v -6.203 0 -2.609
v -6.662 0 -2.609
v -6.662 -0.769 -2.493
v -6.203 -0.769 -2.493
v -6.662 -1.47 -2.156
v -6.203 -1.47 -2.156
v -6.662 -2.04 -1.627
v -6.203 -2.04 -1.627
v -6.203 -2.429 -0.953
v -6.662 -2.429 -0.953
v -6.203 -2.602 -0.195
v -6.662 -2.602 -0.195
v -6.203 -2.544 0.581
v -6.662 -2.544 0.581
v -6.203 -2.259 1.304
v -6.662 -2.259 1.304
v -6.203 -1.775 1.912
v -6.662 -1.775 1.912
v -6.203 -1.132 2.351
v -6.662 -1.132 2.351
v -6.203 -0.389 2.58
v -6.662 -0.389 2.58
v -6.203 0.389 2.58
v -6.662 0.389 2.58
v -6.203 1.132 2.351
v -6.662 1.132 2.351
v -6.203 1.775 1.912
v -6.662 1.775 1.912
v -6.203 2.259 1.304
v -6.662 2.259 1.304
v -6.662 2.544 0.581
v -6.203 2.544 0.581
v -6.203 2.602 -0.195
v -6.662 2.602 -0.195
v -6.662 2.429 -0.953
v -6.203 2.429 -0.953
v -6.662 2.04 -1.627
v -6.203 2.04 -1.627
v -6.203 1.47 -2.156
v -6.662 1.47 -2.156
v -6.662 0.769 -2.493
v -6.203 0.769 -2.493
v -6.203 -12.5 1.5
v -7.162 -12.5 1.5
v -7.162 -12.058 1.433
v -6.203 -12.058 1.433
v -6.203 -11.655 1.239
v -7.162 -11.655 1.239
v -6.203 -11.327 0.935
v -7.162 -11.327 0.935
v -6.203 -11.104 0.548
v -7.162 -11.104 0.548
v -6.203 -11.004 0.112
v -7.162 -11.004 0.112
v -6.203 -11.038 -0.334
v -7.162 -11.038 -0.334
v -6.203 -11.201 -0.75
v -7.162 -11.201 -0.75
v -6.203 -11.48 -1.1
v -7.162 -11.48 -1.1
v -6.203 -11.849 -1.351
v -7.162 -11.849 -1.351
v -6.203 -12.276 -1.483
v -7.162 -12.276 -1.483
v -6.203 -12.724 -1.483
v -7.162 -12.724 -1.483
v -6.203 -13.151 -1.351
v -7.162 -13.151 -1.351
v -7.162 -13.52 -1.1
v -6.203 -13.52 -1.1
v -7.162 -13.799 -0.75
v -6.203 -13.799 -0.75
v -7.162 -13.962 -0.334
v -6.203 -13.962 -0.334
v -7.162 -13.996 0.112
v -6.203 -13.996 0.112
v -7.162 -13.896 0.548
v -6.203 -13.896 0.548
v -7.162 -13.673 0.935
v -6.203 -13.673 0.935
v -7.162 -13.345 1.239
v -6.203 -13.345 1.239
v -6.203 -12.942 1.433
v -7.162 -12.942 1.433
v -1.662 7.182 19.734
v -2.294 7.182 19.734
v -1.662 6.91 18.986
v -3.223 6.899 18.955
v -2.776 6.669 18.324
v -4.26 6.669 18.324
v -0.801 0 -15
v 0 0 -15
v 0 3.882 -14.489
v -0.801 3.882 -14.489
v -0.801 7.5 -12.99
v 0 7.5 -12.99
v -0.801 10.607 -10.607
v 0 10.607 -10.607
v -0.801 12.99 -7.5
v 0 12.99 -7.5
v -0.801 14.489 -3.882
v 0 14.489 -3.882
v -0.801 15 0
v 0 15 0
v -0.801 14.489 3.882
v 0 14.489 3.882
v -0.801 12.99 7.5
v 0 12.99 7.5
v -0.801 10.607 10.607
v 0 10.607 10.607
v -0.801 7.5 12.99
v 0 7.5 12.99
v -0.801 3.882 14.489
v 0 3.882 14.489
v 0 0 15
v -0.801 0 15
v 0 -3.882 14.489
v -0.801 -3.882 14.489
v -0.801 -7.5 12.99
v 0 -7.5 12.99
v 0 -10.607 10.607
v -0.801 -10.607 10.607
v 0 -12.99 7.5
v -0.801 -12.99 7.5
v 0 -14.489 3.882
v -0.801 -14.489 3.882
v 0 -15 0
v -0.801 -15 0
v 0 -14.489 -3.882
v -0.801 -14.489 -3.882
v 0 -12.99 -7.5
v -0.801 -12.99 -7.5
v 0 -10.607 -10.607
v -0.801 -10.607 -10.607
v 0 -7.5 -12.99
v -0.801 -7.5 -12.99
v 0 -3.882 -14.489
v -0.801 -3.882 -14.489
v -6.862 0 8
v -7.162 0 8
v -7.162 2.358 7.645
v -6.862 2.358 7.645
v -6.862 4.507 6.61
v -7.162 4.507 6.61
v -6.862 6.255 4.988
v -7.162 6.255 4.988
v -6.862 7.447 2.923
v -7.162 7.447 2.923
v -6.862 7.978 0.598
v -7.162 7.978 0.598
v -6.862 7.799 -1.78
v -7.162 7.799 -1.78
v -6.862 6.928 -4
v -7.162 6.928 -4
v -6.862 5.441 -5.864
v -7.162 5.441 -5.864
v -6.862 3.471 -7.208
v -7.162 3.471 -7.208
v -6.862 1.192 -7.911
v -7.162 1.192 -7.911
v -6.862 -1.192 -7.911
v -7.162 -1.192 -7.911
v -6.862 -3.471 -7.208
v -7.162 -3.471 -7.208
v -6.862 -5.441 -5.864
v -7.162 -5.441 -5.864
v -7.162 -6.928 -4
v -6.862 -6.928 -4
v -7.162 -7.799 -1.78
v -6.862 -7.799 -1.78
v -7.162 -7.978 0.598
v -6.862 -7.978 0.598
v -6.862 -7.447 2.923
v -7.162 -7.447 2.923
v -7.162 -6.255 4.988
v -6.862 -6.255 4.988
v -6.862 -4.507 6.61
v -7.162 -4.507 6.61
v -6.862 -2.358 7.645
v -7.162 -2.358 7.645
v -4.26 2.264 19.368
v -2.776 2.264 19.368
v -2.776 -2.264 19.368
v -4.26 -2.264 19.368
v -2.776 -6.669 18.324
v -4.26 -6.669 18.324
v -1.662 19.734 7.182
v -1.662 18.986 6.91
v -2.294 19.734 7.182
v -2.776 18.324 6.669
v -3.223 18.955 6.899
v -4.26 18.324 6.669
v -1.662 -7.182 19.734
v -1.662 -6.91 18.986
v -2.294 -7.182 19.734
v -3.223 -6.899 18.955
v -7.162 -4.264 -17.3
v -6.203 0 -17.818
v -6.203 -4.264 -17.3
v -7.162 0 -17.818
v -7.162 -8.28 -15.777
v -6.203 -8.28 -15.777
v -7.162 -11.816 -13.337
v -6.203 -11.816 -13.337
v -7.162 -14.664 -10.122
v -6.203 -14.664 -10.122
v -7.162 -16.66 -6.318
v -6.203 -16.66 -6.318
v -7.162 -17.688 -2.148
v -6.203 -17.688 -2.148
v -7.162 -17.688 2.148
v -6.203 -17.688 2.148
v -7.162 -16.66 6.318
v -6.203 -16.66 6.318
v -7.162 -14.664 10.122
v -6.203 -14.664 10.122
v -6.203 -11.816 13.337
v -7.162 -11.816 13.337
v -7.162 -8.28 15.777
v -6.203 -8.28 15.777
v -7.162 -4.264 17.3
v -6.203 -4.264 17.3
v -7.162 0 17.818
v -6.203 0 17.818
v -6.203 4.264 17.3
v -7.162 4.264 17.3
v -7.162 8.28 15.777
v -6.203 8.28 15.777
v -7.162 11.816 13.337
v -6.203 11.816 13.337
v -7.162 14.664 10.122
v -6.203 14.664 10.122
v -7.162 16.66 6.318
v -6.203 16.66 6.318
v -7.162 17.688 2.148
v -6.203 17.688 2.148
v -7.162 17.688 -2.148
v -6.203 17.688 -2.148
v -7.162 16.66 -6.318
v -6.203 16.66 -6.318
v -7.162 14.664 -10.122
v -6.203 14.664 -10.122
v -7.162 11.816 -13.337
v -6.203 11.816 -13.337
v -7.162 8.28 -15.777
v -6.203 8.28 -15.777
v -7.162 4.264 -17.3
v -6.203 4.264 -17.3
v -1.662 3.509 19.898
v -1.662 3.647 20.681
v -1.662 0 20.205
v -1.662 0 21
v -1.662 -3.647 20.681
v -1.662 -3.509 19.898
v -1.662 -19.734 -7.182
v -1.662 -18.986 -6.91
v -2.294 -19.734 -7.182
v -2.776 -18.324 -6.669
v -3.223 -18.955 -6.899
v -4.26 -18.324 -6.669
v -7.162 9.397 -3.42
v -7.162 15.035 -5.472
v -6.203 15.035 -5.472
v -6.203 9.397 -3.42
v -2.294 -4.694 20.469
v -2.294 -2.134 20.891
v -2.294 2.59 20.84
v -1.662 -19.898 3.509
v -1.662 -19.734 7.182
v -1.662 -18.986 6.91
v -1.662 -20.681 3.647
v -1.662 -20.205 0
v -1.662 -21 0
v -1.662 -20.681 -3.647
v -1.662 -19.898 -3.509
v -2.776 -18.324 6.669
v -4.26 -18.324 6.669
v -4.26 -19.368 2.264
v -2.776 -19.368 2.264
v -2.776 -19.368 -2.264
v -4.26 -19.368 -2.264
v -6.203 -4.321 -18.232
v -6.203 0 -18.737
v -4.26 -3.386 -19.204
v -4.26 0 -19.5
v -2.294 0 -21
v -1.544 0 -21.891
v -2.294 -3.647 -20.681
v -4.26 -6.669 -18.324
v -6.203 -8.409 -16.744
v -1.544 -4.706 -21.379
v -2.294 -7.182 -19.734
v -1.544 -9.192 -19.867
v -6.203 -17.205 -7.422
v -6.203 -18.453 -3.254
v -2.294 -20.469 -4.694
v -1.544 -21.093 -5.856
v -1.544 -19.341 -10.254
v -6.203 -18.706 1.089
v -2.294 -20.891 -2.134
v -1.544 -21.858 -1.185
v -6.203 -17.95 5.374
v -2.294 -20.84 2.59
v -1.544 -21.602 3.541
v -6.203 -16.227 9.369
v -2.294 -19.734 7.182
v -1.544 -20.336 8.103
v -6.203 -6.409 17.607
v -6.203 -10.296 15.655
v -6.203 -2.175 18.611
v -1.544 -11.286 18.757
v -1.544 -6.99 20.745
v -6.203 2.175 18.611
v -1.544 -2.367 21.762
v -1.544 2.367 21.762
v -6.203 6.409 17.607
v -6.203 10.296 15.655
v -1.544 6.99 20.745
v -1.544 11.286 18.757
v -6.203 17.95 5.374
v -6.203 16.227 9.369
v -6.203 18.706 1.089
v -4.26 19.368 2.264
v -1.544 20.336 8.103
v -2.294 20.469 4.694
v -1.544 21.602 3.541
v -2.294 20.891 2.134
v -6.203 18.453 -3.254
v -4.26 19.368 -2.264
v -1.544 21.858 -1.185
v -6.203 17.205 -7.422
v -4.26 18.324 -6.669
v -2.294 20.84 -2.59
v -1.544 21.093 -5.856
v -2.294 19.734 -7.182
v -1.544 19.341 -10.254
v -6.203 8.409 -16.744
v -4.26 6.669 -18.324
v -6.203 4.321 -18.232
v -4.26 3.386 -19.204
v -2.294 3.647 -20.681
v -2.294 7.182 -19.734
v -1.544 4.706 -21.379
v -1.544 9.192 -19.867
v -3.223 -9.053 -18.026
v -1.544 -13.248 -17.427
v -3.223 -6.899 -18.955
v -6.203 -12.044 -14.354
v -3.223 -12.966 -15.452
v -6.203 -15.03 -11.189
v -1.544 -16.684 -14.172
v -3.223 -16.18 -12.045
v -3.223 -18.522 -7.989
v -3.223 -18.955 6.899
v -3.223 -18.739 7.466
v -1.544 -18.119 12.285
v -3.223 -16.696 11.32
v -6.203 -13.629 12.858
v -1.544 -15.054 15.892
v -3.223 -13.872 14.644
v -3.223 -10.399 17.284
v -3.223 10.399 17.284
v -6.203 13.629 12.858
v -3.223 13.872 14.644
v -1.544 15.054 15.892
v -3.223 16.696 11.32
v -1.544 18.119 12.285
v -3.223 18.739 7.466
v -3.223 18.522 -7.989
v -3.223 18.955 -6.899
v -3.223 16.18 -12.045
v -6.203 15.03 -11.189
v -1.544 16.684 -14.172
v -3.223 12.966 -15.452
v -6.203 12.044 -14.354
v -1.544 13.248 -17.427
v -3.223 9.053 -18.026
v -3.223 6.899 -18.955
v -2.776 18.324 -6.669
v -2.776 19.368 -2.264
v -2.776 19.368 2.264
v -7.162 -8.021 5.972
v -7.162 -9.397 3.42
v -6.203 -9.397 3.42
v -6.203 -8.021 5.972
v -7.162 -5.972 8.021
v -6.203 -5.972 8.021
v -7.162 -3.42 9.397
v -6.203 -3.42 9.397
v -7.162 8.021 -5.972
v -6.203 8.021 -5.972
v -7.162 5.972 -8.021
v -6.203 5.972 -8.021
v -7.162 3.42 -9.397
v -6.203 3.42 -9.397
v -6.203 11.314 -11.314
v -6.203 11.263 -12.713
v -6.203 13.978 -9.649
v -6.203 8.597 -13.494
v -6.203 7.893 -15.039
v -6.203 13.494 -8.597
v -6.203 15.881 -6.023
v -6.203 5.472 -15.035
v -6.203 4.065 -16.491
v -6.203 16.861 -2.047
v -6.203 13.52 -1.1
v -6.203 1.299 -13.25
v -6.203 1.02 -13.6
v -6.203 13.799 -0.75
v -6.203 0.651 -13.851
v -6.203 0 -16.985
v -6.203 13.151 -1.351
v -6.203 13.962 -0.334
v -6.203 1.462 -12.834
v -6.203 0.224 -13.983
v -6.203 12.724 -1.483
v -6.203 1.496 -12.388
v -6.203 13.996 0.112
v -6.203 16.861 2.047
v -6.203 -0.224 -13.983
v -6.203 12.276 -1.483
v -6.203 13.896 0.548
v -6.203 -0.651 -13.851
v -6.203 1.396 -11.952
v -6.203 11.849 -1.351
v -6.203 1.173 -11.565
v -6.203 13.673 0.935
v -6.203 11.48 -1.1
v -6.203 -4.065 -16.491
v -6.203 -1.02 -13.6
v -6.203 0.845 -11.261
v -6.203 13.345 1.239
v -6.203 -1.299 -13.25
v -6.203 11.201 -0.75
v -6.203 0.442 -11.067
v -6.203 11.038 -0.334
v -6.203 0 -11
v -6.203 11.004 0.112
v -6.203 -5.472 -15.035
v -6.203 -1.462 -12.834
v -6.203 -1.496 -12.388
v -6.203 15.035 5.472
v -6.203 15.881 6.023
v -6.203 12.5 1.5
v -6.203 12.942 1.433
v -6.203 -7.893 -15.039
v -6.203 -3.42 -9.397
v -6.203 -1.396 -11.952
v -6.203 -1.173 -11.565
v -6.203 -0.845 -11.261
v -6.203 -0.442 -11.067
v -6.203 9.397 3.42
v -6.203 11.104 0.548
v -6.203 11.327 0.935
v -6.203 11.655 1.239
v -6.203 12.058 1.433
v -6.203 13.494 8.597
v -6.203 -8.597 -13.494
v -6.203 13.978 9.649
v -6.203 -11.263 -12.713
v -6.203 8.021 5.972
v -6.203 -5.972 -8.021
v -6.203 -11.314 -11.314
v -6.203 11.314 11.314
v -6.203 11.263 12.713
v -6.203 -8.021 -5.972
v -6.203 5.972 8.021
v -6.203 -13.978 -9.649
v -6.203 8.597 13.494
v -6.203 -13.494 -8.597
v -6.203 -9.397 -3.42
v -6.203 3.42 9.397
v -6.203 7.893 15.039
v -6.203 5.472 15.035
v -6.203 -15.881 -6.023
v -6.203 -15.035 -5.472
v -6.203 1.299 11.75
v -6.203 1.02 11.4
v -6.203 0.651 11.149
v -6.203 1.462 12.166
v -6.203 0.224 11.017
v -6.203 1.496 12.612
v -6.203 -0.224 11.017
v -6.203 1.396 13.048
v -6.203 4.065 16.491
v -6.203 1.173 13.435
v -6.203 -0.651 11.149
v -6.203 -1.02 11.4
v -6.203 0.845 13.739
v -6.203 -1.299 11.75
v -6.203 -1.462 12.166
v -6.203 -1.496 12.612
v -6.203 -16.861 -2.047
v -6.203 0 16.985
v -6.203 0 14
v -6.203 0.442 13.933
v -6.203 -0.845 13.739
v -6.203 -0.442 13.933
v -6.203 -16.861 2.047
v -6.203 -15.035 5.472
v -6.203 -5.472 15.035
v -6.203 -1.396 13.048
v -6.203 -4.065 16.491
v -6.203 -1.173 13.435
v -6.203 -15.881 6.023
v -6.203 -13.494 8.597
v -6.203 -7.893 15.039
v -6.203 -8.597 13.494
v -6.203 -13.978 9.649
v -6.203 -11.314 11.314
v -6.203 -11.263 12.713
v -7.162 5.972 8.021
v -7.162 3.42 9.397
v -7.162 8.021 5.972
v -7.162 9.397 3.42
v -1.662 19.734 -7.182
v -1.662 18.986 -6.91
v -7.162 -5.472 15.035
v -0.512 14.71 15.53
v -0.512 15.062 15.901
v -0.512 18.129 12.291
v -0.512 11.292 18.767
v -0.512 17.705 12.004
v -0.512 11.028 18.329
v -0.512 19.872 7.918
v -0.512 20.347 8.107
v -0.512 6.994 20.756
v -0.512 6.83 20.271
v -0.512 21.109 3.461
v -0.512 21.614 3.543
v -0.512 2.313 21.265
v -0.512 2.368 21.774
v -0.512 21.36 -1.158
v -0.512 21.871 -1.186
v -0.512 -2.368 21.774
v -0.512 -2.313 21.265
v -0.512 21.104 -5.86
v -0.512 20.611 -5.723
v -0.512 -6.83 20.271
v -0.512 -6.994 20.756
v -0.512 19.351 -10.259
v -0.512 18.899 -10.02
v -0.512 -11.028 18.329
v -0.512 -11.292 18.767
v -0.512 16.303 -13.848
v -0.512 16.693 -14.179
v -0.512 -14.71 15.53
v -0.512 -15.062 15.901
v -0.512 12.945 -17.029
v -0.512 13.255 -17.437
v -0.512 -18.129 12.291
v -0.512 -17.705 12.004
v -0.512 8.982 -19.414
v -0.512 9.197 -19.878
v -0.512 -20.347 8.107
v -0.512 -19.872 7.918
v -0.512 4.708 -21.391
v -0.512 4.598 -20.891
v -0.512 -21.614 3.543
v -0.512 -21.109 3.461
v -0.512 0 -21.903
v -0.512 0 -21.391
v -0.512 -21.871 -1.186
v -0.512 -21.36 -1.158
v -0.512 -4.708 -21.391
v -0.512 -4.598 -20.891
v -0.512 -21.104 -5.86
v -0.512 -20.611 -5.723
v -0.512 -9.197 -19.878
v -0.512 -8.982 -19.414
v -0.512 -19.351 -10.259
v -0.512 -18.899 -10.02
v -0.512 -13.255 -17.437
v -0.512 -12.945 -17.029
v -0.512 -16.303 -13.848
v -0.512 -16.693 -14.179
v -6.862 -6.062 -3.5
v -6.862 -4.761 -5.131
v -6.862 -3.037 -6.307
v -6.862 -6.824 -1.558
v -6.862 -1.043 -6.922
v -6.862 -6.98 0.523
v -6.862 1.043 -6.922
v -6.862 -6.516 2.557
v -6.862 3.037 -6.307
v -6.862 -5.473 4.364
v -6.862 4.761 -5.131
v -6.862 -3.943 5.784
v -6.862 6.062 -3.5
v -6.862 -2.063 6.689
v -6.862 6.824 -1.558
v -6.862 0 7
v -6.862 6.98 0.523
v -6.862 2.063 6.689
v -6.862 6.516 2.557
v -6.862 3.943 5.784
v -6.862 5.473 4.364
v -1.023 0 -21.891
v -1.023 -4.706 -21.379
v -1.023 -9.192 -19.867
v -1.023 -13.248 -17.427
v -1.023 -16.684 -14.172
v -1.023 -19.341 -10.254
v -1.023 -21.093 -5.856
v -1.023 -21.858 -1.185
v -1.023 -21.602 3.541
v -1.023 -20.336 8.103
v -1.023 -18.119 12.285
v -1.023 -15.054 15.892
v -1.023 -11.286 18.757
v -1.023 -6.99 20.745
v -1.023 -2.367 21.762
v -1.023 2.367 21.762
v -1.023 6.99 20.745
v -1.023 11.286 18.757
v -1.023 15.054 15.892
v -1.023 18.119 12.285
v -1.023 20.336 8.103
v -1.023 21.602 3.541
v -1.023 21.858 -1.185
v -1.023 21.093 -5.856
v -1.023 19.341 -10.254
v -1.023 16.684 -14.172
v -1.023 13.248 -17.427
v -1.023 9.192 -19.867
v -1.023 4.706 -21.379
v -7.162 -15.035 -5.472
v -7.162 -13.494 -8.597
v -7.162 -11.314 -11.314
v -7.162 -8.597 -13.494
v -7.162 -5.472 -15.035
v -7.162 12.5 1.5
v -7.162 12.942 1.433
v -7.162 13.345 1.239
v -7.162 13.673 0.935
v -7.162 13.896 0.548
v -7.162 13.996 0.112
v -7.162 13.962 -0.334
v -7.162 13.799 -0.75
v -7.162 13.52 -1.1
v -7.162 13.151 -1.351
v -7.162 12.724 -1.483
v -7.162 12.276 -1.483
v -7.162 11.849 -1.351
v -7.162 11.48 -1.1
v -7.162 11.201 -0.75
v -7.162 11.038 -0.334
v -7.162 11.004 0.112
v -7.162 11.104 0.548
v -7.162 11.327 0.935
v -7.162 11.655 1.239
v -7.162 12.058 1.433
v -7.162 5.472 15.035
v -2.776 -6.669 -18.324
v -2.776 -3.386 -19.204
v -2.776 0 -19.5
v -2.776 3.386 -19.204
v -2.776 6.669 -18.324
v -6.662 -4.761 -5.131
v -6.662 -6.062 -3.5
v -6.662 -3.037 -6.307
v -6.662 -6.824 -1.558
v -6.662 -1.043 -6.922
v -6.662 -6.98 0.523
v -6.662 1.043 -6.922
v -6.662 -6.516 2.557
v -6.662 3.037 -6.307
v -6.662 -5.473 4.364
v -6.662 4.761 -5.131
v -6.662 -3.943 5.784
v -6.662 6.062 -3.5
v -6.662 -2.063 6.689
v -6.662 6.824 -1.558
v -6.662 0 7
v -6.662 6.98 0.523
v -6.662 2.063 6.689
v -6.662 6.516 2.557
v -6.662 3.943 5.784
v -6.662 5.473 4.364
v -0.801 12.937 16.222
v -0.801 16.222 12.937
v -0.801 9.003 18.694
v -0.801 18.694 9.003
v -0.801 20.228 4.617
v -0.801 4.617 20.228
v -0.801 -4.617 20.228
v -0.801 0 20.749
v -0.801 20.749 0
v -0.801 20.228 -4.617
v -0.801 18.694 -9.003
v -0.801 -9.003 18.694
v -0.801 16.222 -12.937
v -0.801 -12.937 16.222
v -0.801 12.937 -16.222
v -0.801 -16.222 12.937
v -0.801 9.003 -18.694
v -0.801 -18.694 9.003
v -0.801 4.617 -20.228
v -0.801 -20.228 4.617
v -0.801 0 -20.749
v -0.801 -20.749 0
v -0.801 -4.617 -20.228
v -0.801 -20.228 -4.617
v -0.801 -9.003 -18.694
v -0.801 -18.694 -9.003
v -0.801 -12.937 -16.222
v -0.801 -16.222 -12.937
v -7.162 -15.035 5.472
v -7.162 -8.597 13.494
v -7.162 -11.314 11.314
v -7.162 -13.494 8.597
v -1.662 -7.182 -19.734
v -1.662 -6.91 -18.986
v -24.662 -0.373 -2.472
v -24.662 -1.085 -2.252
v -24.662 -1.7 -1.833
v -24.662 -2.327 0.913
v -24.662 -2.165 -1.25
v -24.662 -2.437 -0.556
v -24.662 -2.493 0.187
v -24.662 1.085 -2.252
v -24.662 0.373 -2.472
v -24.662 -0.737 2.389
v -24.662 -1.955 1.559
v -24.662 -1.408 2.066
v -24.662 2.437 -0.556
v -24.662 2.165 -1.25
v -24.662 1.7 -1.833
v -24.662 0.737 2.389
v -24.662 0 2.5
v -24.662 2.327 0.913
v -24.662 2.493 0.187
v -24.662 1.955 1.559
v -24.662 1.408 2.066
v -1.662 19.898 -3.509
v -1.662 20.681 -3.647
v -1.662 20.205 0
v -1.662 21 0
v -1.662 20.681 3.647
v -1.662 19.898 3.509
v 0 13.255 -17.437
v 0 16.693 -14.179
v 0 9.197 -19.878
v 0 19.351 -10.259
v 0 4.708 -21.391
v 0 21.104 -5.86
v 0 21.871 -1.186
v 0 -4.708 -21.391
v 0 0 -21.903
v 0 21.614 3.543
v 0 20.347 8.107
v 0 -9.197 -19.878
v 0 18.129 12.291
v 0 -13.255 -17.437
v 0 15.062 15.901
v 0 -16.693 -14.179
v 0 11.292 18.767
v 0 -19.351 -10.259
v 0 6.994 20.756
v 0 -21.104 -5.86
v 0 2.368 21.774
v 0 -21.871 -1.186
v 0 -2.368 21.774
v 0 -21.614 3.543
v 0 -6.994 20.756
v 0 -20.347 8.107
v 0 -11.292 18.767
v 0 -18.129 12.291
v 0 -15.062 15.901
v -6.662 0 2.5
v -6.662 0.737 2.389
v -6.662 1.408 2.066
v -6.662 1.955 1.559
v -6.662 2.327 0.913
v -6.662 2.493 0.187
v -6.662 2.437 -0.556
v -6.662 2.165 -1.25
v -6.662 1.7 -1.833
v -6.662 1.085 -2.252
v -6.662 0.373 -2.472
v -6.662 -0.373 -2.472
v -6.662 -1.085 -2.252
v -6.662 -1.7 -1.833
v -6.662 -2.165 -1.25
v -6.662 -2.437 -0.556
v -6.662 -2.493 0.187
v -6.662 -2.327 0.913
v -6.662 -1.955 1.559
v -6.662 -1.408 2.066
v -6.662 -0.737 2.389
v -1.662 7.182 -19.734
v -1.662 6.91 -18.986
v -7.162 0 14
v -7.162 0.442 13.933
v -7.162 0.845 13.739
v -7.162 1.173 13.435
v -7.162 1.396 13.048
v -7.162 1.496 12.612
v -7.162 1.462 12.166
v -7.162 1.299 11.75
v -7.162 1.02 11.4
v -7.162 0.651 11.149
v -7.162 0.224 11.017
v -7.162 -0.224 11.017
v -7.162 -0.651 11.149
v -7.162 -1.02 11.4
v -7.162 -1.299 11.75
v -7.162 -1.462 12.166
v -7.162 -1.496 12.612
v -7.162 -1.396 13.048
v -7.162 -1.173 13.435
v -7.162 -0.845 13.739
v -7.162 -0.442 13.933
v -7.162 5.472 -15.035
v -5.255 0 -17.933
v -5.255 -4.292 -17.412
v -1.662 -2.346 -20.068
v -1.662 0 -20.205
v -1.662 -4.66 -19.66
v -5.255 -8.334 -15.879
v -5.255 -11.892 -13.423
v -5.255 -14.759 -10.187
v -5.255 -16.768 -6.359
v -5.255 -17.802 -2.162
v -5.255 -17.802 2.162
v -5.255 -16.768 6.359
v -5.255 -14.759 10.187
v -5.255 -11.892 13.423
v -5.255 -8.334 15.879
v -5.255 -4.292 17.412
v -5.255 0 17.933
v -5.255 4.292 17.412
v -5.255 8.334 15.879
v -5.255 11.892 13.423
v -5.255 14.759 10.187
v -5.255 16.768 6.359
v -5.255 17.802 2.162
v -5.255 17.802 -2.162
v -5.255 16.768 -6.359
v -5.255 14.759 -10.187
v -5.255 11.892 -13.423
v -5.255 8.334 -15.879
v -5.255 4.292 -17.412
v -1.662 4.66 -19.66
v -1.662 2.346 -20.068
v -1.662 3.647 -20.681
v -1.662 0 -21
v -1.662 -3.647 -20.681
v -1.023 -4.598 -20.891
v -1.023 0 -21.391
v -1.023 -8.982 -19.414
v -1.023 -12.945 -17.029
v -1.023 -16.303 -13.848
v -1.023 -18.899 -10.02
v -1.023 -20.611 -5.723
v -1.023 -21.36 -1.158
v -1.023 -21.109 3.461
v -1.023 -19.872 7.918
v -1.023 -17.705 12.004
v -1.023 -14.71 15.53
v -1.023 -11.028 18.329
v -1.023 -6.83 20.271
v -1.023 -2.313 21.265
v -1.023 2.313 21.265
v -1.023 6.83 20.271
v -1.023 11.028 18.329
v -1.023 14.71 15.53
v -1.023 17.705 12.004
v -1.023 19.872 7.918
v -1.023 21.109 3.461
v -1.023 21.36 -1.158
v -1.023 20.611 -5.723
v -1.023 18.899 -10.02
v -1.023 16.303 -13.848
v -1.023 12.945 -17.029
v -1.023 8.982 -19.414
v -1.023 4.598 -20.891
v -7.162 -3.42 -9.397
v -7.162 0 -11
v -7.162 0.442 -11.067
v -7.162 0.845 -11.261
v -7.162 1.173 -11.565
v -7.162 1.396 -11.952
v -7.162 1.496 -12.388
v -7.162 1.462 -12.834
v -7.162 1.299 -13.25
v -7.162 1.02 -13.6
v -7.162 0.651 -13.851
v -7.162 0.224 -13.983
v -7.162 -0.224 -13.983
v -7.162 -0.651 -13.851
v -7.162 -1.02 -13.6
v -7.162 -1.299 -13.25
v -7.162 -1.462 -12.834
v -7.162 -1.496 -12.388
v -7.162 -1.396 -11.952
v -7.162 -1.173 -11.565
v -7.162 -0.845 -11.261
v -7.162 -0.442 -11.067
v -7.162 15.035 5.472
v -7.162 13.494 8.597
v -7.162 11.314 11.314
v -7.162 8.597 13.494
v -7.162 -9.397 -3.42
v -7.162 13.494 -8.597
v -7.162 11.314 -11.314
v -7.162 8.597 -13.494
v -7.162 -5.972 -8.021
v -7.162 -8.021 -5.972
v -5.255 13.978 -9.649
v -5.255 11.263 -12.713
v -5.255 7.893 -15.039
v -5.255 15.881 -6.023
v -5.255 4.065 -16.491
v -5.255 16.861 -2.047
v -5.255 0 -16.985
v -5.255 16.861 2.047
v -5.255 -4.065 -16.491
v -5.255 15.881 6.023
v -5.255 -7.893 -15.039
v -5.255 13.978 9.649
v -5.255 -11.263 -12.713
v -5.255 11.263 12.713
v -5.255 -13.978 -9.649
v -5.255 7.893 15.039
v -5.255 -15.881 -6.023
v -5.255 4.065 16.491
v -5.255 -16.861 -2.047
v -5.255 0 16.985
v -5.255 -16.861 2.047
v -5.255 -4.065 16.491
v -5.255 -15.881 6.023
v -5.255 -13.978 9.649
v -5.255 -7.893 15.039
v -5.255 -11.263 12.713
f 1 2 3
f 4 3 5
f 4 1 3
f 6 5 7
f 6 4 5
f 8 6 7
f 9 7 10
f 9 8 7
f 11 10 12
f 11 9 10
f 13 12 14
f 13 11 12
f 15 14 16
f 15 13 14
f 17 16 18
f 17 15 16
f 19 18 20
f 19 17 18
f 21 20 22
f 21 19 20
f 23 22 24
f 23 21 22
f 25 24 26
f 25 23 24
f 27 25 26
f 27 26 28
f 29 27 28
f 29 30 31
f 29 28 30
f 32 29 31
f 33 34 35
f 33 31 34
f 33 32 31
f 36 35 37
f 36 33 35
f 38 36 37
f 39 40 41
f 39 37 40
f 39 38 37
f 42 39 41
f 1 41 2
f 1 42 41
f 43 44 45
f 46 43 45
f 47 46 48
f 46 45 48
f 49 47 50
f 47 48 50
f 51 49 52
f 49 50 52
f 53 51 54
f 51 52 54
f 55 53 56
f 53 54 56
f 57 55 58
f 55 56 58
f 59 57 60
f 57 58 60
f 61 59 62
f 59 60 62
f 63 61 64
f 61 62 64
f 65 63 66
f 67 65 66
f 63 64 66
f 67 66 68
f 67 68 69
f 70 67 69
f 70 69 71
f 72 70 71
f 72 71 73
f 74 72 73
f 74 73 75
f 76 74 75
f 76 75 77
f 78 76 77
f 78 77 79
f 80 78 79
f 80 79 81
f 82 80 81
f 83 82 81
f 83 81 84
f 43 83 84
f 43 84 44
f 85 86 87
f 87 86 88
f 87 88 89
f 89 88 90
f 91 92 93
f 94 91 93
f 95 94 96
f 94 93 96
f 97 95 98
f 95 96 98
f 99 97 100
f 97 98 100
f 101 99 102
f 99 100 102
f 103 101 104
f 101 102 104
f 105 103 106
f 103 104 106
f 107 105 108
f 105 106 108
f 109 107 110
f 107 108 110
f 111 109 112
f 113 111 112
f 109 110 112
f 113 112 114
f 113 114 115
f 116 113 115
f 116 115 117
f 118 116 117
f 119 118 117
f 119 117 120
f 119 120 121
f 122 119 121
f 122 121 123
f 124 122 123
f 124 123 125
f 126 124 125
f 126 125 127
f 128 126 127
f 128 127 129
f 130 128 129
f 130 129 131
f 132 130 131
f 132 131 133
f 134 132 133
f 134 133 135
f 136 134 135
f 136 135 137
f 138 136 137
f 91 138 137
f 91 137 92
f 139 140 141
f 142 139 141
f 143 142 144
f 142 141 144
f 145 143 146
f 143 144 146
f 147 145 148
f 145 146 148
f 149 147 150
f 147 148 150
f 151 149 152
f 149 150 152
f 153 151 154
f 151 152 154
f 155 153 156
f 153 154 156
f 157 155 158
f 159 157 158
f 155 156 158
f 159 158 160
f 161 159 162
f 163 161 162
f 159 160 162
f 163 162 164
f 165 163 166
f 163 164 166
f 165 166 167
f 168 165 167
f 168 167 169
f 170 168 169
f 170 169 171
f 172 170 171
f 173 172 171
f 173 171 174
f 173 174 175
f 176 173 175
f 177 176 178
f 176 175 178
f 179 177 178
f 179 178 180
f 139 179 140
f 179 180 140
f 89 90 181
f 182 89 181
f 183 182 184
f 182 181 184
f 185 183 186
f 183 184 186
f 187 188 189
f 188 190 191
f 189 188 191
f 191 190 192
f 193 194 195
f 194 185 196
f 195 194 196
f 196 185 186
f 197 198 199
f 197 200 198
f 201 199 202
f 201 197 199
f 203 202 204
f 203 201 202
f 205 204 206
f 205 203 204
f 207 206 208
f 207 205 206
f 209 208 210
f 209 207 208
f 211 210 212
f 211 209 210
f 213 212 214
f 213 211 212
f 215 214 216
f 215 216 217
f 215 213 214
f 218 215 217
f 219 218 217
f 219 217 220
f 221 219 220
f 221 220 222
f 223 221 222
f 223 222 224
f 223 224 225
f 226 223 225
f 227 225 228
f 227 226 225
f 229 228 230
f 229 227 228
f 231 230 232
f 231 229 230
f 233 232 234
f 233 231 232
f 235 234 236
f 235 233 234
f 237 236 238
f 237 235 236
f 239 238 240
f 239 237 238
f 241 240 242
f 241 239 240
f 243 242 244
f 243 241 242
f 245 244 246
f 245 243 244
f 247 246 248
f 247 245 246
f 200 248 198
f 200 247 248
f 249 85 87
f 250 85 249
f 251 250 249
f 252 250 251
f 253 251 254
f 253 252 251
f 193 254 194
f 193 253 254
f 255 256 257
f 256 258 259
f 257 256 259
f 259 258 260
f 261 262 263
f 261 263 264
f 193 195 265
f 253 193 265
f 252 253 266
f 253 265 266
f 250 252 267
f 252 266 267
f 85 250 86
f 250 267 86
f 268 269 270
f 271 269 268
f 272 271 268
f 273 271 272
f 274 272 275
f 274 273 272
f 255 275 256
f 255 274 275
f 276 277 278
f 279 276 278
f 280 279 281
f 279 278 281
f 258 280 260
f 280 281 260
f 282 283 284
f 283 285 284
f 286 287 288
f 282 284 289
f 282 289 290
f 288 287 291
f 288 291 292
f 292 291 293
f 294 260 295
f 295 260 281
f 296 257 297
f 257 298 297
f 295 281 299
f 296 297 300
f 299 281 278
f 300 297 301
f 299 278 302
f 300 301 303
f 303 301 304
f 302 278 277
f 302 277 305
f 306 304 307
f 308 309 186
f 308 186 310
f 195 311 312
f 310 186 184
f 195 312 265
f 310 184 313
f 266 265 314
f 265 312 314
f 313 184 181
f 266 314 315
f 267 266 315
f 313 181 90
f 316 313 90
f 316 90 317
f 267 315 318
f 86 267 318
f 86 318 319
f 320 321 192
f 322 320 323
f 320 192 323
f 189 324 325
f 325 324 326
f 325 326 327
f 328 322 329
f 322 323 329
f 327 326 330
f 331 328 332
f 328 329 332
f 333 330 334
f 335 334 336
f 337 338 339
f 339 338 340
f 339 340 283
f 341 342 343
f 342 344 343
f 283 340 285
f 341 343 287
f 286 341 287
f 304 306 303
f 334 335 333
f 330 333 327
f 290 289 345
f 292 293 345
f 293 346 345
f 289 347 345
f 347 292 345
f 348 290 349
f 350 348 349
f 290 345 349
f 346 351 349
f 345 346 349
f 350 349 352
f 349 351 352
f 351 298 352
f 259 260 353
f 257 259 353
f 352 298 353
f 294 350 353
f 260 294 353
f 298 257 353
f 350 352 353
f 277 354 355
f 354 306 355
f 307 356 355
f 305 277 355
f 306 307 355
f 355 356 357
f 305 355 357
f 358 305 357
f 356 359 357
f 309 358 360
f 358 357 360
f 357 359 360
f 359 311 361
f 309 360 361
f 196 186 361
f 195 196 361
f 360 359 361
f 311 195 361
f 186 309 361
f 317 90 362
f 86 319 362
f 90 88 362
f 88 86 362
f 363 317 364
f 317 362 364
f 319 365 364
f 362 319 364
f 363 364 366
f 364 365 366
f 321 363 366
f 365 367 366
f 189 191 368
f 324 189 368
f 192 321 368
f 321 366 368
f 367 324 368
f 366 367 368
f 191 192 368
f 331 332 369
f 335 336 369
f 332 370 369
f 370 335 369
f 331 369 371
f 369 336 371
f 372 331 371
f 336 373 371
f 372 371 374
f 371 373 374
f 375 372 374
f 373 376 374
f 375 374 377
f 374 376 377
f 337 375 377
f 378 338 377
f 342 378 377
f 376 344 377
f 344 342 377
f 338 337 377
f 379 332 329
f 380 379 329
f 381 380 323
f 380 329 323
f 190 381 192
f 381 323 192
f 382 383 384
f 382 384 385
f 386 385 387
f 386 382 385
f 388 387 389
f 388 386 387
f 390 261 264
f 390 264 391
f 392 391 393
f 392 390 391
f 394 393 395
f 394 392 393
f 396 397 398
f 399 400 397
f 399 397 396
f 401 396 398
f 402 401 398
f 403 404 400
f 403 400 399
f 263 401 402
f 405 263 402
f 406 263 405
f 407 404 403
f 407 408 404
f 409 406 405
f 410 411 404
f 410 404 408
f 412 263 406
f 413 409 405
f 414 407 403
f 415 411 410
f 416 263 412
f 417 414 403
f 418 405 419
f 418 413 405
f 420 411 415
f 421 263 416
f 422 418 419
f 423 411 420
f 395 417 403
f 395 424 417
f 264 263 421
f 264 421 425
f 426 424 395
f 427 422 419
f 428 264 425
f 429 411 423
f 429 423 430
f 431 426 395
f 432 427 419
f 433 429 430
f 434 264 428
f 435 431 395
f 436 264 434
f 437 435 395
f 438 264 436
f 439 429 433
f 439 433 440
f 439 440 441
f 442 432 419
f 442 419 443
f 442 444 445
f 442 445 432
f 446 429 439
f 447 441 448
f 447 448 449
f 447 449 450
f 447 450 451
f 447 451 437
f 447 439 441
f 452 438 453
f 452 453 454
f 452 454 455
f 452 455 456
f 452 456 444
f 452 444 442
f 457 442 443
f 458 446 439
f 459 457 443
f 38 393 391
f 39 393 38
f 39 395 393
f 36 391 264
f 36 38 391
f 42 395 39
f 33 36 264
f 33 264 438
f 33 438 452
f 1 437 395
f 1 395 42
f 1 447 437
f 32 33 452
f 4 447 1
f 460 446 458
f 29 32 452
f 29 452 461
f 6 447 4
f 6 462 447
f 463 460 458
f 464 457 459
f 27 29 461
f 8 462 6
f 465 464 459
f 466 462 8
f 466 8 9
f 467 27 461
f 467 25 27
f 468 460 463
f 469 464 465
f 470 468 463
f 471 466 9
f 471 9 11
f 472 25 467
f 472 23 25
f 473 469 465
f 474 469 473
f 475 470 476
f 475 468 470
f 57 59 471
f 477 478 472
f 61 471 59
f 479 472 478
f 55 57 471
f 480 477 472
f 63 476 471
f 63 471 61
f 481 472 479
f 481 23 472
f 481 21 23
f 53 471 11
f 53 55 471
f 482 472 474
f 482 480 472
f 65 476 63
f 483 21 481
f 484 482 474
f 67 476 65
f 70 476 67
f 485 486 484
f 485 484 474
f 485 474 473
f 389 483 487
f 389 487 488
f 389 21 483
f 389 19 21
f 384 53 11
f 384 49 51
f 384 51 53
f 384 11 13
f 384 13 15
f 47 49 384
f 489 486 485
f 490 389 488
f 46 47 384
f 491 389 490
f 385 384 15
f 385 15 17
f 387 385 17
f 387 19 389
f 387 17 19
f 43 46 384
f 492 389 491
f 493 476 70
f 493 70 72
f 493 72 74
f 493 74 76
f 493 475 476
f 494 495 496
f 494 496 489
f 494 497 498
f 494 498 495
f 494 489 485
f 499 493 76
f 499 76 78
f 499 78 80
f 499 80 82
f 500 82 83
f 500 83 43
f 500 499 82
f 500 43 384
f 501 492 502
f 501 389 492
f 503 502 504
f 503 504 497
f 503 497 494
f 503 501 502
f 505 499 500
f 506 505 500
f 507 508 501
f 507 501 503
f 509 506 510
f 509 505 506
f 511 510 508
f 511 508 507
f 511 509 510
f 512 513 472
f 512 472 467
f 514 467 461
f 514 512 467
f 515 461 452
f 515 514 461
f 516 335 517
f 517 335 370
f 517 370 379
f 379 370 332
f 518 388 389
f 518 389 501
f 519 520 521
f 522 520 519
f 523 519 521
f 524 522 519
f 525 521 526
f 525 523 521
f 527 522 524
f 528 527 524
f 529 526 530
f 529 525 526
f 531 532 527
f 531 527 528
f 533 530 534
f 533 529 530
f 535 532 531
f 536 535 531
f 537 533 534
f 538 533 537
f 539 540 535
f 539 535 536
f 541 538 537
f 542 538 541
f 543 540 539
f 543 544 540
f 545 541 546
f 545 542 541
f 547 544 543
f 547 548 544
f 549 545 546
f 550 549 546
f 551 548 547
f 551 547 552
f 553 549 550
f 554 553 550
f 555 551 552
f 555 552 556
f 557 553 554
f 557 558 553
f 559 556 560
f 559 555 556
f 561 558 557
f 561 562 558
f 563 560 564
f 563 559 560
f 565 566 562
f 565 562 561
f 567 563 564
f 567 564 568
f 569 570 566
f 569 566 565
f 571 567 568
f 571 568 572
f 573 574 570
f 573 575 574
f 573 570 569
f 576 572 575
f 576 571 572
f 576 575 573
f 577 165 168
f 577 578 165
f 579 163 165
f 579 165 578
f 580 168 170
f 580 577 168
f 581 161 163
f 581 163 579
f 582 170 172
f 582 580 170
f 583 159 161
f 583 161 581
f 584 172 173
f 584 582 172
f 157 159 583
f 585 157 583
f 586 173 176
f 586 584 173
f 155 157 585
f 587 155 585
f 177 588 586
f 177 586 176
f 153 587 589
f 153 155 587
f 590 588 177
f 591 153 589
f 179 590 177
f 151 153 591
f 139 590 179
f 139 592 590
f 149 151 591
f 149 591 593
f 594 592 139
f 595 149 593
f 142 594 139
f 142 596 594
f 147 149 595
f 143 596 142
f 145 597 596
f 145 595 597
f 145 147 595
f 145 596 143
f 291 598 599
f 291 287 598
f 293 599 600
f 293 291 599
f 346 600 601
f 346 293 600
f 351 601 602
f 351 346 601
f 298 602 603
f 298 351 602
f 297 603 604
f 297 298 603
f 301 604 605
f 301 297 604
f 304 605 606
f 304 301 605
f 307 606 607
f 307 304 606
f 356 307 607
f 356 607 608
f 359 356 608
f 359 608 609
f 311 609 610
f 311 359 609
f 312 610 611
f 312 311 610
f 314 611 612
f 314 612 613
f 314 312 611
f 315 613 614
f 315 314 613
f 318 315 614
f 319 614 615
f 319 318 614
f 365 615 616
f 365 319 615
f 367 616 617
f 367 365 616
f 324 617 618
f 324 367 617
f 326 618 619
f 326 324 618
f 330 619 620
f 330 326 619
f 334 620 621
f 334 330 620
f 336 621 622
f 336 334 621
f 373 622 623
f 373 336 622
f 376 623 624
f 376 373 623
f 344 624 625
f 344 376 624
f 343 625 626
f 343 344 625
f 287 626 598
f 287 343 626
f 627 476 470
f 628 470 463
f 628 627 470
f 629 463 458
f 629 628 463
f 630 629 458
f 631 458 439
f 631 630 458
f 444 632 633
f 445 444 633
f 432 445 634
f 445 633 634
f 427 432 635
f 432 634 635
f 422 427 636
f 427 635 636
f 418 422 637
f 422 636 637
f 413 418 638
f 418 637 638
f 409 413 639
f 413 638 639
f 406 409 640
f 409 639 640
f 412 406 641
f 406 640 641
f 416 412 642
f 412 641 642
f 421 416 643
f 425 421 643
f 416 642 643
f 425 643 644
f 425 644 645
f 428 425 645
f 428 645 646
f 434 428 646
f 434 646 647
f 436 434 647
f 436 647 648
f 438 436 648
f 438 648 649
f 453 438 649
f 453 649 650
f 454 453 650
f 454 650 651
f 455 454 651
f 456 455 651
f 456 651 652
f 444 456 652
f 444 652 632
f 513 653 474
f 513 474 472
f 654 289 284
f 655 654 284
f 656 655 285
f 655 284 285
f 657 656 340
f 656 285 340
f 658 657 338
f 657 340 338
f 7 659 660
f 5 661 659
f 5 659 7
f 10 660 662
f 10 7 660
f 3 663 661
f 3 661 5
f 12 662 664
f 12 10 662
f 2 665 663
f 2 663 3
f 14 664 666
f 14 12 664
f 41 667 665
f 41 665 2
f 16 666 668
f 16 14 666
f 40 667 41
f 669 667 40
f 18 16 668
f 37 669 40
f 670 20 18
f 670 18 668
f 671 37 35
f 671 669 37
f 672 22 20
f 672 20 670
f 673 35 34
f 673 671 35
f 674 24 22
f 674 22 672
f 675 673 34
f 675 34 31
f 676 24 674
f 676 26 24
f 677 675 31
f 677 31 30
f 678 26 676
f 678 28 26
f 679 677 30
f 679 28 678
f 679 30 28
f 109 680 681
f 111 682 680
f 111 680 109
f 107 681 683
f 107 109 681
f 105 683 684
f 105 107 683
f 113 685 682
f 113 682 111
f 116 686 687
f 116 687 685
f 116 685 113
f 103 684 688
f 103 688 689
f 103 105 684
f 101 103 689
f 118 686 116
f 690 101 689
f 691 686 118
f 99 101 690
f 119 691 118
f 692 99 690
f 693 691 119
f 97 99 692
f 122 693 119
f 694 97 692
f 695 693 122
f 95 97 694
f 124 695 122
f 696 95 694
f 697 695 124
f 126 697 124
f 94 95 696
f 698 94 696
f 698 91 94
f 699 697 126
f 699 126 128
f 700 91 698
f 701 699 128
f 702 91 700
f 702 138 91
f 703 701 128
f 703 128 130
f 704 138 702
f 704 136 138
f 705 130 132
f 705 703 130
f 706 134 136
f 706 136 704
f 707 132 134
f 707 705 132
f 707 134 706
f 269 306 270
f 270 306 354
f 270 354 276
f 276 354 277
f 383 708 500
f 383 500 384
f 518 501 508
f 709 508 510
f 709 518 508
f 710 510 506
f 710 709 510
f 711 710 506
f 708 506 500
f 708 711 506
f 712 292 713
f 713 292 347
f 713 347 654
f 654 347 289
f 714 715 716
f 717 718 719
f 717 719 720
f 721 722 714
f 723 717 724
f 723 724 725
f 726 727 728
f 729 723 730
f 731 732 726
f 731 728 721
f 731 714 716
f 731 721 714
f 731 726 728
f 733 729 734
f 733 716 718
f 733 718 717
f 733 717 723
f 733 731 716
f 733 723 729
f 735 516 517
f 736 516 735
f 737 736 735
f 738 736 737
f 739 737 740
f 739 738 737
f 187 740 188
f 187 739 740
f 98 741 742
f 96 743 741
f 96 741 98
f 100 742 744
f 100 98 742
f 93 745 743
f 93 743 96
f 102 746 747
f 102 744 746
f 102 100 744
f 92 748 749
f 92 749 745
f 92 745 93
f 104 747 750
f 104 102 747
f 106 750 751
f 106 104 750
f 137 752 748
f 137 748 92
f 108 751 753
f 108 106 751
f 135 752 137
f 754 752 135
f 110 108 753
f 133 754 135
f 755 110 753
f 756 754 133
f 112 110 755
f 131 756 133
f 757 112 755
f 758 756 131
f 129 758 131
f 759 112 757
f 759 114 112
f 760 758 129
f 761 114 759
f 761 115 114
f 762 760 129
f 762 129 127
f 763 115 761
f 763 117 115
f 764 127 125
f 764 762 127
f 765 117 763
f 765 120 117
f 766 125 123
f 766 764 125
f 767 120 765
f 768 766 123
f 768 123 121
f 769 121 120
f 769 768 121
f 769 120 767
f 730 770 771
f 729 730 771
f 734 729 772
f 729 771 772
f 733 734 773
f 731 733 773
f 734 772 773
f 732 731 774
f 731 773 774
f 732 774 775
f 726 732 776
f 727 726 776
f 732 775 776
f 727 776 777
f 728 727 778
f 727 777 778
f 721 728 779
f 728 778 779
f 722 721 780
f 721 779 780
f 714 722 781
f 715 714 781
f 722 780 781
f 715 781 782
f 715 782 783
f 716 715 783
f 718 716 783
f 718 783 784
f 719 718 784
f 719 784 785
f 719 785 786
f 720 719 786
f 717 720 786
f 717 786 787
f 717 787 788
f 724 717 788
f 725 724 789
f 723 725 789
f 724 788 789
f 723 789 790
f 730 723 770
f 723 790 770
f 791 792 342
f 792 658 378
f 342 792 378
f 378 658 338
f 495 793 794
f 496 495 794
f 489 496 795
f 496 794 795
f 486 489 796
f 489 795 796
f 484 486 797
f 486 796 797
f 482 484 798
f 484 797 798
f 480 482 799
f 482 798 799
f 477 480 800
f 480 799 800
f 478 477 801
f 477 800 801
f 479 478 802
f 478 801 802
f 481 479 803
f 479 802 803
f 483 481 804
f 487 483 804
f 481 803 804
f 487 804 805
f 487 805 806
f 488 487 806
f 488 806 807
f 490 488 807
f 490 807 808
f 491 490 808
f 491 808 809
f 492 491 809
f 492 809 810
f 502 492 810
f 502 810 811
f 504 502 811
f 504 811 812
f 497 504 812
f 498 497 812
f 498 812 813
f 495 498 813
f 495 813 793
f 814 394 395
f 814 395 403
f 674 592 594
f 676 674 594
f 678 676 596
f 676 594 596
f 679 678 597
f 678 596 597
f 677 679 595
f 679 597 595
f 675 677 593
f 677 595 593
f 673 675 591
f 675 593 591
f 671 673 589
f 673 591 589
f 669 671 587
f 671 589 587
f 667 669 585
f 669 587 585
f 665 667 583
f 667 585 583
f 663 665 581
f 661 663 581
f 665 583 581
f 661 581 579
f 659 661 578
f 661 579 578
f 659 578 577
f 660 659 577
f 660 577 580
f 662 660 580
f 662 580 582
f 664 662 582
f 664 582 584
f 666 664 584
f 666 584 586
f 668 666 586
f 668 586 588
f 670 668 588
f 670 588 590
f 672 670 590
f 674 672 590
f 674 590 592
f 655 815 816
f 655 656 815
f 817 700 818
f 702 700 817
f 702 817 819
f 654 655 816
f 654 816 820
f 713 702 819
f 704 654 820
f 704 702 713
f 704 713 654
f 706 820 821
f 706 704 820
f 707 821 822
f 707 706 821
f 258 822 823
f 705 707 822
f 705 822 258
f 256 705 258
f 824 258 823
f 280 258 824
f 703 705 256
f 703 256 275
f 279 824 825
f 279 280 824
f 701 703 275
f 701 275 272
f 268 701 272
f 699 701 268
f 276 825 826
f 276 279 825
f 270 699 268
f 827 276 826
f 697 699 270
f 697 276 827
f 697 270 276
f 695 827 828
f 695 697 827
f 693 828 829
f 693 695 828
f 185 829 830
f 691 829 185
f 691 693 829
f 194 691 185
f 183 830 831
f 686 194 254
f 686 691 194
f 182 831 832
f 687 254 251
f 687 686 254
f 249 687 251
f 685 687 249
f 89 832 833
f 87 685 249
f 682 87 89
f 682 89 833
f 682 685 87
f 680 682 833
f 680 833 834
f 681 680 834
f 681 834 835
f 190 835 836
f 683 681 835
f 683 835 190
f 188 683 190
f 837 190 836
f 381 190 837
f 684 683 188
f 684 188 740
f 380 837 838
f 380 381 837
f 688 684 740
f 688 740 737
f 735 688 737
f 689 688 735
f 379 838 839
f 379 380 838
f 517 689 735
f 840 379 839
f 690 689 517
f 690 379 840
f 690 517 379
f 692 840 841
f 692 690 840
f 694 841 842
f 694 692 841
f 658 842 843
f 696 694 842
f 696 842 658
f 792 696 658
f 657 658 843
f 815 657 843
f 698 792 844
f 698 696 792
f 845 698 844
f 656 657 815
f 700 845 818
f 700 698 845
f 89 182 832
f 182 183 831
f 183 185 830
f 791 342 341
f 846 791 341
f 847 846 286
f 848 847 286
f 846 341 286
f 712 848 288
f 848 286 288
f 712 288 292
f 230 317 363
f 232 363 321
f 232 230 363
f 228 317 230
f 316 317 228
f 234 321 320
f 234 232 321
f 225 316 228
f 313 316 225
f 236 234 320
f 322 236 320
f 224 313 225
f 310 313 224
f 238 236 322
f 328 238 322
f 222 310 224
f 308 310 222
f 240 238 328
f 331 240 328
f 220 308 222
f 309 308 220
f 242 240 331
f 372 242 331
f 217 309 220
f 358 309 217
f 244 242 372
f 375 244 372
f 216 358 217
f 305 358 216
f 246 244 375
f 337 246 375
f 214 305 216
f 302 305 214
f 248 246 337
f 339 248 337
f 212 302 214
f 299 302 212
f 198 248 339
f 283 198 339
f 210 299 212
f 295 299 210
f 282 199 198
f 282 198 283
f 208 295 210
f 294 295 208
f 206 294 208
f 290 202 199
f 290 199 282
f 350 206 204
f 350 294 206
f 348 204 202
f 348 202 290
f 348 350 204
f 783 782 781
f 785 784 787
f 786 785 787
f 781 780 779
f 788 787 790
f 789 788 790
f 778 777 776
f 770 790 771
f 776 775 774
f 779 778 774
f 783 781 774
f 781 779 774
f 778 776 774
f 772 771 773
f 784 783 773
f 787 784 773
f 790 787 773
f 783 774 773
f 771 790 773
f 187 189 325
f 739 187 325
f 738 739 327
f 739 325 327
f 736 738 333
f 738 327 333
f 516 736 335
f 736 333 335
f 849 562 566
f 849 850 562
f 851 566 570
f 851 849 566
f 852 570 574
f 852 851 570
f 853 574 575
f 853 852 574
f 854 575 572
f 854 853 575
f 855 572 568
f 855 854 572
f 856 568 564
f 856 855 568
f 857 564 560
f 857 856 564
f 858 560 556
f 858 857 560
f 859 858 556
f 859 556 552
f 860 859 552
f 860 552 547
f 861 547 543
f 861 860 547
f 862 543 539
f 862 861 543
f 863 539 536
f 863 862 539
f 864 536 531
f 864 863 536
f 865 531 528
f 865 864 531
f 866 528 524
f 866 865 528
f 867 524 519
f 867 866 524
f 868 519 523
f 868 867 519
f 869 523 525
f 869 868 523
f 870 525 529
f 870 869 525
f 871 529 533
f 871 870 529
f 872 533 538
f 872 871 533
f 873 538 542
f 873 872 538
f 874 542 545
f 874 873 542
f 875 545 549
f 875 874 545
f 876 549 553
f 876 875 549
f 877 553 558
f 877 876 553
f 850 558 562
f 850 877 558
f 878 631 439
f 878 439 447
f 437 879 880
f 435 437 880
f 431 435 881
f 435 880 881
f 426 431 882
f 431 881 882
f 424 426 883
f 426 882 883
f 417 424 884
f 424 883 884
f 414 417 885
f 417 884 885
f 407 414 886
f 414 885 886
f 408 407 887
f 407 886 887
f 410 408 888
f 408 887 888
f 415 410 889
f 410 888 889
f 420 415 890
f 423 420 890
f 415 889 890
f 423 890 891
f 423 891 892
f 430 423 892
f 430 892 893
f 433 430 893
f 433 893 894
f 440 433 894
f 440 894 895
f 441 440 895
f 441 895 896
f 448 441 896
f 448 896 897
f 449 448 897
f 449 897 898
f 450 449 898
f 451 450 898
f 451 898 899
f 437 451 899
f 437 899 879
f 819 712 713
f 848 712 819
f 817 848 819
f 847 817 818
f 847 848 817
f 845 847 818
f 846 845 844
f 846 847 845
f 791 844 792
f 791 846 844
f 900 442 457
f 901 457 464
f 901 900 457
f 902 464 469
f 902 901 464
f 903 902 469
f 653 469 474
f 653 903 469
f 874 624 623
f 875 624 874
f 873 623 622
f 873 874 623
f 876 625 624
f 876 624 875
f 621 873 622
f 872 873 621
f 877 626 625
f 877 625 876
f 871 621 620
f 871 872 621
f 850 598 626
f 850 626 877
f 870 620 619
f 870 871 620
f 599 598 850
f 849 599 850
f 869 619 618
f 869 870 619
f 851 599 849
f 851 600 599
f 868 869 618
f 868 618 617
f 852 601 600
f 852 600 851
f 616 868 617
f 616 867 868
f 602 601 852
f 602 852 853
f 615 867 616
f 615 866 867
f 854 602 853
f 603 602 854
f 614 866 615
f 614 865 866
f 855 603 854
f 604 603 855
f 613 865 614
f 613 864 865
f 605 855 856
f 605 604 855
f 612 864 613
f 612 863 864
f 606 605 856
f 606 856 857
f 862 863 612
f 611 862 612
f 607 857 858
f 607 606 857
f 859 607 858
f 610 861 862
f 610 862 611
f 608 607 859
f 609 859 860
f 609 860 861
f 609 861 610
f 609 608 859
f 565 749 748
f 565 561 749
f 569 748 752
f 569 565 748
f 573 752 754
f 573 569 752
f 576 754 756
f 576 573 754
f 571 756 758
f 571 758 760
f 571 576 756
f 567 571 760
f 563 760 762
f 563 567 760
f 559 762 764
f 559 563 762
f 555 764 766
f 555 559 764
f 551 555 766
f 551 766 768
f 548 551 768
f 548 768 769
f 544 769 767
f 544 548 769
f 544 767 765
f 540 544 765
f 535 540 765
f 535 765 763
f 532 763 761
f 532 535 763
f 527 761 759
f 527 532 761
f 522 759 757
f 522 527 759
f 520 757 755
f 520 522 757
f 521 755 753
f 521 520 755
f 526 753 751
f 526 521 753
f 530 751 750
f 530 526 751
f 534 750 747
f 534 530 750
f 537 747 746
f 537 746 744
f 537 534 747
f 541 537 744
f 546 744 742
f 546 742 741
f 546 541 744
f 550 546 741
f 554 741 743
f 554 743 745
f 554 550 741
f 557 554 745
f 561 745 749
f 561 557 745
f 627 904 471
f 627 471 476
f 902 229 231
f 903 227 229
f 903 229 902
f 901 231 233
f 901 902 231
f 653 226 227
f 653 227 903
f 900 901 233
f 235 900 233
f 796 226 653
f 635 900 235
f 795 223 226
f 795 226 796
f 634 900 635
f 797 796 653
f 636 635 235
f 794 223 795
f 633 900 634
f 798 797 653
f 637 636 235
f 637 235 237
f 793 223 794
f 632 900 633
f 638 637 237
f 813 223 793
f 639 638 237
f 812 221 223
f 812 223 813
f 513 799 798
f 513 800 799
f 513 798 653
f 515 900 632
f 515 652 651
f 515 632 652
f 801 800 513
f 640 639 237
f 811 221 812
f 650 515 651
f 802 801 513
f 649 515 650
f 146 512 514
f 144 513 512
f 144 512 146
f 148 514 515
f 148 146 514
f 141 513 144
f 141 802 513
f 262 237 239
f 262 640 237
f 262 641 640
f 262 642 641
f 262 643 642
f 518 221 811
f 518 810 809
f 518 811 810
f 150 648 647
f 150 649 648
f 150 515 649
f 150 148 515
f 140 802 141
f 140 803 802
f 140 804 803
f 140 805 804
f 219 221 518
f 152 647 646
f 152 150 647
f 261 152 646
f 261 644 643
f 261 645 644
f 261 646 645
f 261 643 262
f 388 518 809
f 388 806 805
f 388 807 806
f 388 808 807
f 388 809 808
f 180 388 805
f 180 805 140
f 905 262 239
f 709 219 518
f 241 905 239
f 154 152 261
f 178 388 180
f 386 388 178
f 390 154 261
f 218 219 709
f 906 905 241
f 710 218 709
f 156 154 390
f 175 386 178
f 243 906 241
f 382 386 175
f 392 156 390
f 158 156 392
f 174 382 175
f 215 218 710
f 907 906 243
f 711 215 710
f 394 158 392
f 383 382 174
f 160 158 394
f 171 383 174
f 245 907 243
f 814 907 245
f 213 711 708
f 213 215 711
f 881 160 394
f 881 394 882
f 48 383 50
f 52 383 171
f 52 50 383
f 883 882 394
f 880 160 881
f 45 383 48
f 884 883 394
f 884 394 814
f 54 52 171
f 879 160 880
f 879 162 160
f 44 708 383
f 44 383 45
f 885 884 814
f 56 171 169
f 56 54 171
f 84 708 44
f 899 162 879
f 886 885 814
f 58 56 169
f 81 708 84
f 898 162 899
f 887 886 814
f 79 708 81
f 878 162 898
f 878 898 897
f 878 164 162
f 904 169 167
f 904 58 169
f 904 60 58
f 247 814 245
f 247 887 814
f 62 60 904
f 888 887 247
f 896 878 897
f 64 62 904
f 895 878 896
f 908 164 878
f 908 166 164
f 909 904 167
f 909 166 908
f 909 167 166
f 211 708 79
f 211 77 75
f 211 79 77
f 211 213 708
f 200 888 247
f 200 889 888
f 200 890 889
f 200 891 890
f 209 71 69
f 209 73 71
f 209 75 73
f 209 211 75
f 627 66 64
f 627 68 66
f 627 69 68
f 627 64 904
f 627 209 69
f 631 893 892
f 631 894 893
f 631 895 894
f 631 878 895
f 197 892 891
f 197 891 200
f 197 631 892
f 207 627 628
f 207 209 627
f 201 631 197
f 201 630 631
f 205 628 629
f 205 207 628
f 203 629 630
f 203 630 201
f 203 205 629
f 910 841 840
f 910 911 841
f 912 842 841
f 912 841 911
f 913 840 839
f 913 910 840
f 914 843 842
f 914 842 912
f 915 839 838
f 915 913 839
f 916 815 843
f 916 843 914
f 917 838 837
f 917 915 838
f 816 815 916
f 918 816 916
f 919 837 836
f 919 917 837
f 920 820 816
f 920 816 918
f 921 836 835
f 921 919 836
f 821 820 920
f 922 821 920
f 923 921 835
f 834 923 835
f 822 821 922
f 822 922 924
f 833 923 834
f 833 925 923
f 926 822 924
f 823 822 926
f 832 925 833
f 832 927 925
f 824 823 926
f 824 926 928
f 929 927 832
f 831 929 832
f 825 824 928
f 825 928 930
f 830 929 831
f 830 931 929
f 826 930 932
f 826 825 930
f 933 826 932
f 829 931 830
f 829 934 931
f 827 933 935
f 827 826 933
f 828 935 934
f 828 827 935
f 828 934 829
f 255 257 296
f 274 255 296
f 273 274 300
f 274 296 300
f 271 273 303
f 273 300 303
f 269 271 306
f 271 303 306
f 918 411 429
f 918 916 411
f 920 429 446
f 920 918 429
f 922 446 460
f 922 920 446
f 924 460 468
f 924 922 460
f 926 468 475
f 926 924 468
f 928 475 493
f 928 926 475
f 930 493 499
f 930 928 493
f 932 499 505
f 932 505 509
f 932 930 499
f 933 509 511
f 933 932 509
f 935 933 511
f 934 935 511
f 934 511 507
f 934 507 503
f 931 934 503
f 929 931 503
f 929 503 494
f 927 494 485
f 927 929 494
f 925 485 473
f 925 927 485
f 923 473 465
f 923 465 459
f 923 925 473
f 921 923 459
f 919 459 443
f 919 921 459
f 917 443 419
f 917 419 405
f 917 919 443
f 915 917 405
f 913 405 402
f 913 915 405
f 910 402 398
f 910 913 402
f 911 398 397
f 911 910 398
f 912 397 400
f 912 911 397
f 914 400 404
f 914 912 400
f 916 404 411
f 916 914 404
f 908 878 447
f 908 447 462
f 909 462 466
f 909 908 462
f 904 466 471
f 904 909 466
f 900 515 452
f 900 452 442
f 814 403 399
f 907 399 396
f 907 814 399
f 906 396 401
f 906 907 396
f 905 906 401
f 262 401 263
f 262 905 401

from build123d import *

# Parameters (mm, degrees)
SKETCH6_R           = 1.5
CUT_EXTRUDE2_DEPTH  = 10
SKETCH7_R           = 1.5
CUT_EXTRUDE3_DEPTH  = 10
SKETCH9_R           = 15
CUT_EXTRUDE6_DEPTH  = 2
SKETCH10_R          = 7
CUT_EXTRUDE10_DEPTH = 0.5
SKETCH11_R          = 8
CUT_EXTRUDE11_DEPTH = 0.3
CUT_EXTRUDE12_DEPTH = 5.5
CIRPATTERN1_COUNT   = 4
CUT_EXTRUDE13_DEPTH = 5.5
CIRPATTERN2_COUNT   = 4
SKETCH14_R          = 2.5
BOSS_EXTRUDE1_DEPTH = 18


with BuildPart() as part:
    # Sketch1 → Revolve5 (revolve)
    with BuildSketch(Plane(origin=(0, 0, 0), x_dir=(1, 0, 0), z_dir=(0, 1, 0))):
        with BuildLine():
            Line((-0.801439764, 0), (0, 0))
            Line((0, 0), (0, 21.902624806))
            Line((0, 21.902624806), (-0.51174357, 21.902624806))
            Line((-0.51174357, 21.902624806), (-0.51174357, 21.390881236))
            Line((-0.51174357, 21.390881236), (-1.02348714, 21.390881236))
            Line((-1.02348714, 21.390881236), (-1.02348714, 21.890510973))
            Line((-1.02348714, 21.890510973), (-1.544434098, 21.890510973))
            add(Edge.make_bspline(
                [(-6.202911031, 18.737475773), (-3.305817899, 19.500531362), (-1.544434098, 21.890510973)],
                knots=[0, 0, 0, 1, 1, 1], degree=2))
            Line((-6.202911031, 18.737475773), (-6.202911031, 17.818076408))
            Line((-6.202911031, 17.818076408), (-7.161566328, 17.818076408))
            Line((-7.161566328, 17.818076408), (-7.161566328, 2.608912222))
            Line((-7.161566328, 2.608912222), (-6.202911031, 2.608912222))
            Line((-6.202911031, 2.608912222), (-6.202911031, 16.984870734))
            Line((-6.202911031, 16.984870734), (-5.254780436, 16.984870734))
            Line((-5.254780436, 16.984870734), (-5.254780436, 17.933123671))
            Line((-5.254780436, 17.933123671), (-0.801439764, 20.748661883))
            Line((-0.801439764, 20.748661883), (-0.801439764, 0))
        make_face()
    revolve(axis=Axis((0, 0, 0), (-1, 0, 0)))

    # Sketch6 → Cut-Extrude2 (cut)
    with BuildSketch(Plane.ZY.offset(7.161566328)):
        with Locations((0, 12.5)):
            Circle(SKETCH6_R)
    extrude(amount=-CUT_EXTRUDE2_DEPTH, mode=Mode.SUBTRACT)

    # Sketch7 → Cut-Extrude3 (cut)
    with BuildSketch(Plane.ZY.offset(7.161566328)):
        with Locations((12.5, 0)):
            Circle(SKETCH7_R)
        with Locations((0, -12.5)):
            Circle(SKETCH7_R)
        with Locations((-12.5, 0)):
            Circle(SKETCH7_R)
    extrude(amount=-CUT_EXTRUDE3_DEPTH, mode=Mode.SUBTRACT)

    # Sketch9 → Cut-Extrude6 (cut)
    with BuildSketch(Plane(origin=(0, 0, 0), x_dir=(0, 0, -1), z_dir=(1, 0, 0))):
        Circle(SKETCH9_R)
    extrude(amount=-CUT_EXTRUDE6_DEPTH, mode=Mode.SUBTRACT)

    # Sketch10 → Cut-Extrude10 (cut)
    with BuildSketch(Plane.ZY.offset(7.161566328)):
        Circle(SKETCH10_R)
    extrude(amount=-CUT_EXTRUDE10_DEPTH, mode=Mode.SUBTRACT)

    # Sketch11 → Cut-Extrude11 (cut)
    with BuildSketch(Plane.ZY.offset(7.161566328)):
        Circle(SKETCH11_R)
    extrude(amount=-CUT_EXTRUDE11_DEPTH, mode=Mode.SUBTRACT)

    # Sketch12 → Cut-Extrude12 (cut)
    with BuildSketch(Plane.ZY.offset(7.161566328)):
        with BuildLine():
            ThreePointArc((-6.669392795, 18.324006105), (0, 19.5), (6.669392795, 18.324006105))
            Line((6.669392795, 18.324006105), (7.18242301, 19.733545037))
            ThreePointArc((7.18242301, 19.733545037), (0, 21), (-7.18242301, 19.733545037))
            Line((-7.18242301, 19.733545037), (-6.669392795, 18.324006105))
        make_face()
    cut_extrude12 = extrude(amount=-CUT_EXTRUDE12_DEPTH, mode=Mode.SUBTRACT)

    # CirPattern1: Cut-Extrude12 ×4 about axis
    cirpattern1_axis = Axis((-6.661566328, 0, 0), (-1, 0, 0))
    for i in range(1, CIRPATTERN1_COUNT):
        add(cut_extrude12.rotate(cirpattern1_axis, i * 360 / CIRPATTERN1_COUNT), mode=Mode.SUBTRACT)

    # Sketch13 → Cut-Extrude13 (cut)
    with BuildSketch(Plane.ZY.offset(7.161566328)):
        with BuildLine():
            Line((3.420201433, 9.396926208), (5.472322293, 15.035081933))
            ThreePointArc((5.472322293, 15.035081933), (11.313708499, 11.313708499), (15.035081933, 5.472322293))
            Line((15.035081933, 5.472322293), (9.396926208, 3.420201433))
            ThreePointArc((9.396926208, 3.420201433), (7.071067812, 7.071067812), (3.420201433, 9.396926208))
        make_face()
    cut_extrude13 = extrude(amount=-CUT_EXTRUDE13_DEPTH, mode=Mode.SUBTRACT)

    # CirPattern2: Cut-Extrude13 ×4 about axis
    cirpattern2_axis = Axis((-6.661566328, 0, 0), (-1, 0, 0))
    for i in range(1, CIRPATTERN2_COUNT):
        add(cut_extrude13.rotate(cirpattern2_axis, i * 360 / CIRPATTERN2_COUNT), mode=Mode.SUBTRACT)


with BuildPart() as body_2:
    # Sketch14 → Boss-Extrude1 (new body)
    with BuildSketch(Plane.ZY.offset(6.661566328)):
        Circle(SKETCH14_R)
    extrude(amount=BOSS_EXTRUDE1_DEPTH)


solid = Compound([part.part, body_2.part])
